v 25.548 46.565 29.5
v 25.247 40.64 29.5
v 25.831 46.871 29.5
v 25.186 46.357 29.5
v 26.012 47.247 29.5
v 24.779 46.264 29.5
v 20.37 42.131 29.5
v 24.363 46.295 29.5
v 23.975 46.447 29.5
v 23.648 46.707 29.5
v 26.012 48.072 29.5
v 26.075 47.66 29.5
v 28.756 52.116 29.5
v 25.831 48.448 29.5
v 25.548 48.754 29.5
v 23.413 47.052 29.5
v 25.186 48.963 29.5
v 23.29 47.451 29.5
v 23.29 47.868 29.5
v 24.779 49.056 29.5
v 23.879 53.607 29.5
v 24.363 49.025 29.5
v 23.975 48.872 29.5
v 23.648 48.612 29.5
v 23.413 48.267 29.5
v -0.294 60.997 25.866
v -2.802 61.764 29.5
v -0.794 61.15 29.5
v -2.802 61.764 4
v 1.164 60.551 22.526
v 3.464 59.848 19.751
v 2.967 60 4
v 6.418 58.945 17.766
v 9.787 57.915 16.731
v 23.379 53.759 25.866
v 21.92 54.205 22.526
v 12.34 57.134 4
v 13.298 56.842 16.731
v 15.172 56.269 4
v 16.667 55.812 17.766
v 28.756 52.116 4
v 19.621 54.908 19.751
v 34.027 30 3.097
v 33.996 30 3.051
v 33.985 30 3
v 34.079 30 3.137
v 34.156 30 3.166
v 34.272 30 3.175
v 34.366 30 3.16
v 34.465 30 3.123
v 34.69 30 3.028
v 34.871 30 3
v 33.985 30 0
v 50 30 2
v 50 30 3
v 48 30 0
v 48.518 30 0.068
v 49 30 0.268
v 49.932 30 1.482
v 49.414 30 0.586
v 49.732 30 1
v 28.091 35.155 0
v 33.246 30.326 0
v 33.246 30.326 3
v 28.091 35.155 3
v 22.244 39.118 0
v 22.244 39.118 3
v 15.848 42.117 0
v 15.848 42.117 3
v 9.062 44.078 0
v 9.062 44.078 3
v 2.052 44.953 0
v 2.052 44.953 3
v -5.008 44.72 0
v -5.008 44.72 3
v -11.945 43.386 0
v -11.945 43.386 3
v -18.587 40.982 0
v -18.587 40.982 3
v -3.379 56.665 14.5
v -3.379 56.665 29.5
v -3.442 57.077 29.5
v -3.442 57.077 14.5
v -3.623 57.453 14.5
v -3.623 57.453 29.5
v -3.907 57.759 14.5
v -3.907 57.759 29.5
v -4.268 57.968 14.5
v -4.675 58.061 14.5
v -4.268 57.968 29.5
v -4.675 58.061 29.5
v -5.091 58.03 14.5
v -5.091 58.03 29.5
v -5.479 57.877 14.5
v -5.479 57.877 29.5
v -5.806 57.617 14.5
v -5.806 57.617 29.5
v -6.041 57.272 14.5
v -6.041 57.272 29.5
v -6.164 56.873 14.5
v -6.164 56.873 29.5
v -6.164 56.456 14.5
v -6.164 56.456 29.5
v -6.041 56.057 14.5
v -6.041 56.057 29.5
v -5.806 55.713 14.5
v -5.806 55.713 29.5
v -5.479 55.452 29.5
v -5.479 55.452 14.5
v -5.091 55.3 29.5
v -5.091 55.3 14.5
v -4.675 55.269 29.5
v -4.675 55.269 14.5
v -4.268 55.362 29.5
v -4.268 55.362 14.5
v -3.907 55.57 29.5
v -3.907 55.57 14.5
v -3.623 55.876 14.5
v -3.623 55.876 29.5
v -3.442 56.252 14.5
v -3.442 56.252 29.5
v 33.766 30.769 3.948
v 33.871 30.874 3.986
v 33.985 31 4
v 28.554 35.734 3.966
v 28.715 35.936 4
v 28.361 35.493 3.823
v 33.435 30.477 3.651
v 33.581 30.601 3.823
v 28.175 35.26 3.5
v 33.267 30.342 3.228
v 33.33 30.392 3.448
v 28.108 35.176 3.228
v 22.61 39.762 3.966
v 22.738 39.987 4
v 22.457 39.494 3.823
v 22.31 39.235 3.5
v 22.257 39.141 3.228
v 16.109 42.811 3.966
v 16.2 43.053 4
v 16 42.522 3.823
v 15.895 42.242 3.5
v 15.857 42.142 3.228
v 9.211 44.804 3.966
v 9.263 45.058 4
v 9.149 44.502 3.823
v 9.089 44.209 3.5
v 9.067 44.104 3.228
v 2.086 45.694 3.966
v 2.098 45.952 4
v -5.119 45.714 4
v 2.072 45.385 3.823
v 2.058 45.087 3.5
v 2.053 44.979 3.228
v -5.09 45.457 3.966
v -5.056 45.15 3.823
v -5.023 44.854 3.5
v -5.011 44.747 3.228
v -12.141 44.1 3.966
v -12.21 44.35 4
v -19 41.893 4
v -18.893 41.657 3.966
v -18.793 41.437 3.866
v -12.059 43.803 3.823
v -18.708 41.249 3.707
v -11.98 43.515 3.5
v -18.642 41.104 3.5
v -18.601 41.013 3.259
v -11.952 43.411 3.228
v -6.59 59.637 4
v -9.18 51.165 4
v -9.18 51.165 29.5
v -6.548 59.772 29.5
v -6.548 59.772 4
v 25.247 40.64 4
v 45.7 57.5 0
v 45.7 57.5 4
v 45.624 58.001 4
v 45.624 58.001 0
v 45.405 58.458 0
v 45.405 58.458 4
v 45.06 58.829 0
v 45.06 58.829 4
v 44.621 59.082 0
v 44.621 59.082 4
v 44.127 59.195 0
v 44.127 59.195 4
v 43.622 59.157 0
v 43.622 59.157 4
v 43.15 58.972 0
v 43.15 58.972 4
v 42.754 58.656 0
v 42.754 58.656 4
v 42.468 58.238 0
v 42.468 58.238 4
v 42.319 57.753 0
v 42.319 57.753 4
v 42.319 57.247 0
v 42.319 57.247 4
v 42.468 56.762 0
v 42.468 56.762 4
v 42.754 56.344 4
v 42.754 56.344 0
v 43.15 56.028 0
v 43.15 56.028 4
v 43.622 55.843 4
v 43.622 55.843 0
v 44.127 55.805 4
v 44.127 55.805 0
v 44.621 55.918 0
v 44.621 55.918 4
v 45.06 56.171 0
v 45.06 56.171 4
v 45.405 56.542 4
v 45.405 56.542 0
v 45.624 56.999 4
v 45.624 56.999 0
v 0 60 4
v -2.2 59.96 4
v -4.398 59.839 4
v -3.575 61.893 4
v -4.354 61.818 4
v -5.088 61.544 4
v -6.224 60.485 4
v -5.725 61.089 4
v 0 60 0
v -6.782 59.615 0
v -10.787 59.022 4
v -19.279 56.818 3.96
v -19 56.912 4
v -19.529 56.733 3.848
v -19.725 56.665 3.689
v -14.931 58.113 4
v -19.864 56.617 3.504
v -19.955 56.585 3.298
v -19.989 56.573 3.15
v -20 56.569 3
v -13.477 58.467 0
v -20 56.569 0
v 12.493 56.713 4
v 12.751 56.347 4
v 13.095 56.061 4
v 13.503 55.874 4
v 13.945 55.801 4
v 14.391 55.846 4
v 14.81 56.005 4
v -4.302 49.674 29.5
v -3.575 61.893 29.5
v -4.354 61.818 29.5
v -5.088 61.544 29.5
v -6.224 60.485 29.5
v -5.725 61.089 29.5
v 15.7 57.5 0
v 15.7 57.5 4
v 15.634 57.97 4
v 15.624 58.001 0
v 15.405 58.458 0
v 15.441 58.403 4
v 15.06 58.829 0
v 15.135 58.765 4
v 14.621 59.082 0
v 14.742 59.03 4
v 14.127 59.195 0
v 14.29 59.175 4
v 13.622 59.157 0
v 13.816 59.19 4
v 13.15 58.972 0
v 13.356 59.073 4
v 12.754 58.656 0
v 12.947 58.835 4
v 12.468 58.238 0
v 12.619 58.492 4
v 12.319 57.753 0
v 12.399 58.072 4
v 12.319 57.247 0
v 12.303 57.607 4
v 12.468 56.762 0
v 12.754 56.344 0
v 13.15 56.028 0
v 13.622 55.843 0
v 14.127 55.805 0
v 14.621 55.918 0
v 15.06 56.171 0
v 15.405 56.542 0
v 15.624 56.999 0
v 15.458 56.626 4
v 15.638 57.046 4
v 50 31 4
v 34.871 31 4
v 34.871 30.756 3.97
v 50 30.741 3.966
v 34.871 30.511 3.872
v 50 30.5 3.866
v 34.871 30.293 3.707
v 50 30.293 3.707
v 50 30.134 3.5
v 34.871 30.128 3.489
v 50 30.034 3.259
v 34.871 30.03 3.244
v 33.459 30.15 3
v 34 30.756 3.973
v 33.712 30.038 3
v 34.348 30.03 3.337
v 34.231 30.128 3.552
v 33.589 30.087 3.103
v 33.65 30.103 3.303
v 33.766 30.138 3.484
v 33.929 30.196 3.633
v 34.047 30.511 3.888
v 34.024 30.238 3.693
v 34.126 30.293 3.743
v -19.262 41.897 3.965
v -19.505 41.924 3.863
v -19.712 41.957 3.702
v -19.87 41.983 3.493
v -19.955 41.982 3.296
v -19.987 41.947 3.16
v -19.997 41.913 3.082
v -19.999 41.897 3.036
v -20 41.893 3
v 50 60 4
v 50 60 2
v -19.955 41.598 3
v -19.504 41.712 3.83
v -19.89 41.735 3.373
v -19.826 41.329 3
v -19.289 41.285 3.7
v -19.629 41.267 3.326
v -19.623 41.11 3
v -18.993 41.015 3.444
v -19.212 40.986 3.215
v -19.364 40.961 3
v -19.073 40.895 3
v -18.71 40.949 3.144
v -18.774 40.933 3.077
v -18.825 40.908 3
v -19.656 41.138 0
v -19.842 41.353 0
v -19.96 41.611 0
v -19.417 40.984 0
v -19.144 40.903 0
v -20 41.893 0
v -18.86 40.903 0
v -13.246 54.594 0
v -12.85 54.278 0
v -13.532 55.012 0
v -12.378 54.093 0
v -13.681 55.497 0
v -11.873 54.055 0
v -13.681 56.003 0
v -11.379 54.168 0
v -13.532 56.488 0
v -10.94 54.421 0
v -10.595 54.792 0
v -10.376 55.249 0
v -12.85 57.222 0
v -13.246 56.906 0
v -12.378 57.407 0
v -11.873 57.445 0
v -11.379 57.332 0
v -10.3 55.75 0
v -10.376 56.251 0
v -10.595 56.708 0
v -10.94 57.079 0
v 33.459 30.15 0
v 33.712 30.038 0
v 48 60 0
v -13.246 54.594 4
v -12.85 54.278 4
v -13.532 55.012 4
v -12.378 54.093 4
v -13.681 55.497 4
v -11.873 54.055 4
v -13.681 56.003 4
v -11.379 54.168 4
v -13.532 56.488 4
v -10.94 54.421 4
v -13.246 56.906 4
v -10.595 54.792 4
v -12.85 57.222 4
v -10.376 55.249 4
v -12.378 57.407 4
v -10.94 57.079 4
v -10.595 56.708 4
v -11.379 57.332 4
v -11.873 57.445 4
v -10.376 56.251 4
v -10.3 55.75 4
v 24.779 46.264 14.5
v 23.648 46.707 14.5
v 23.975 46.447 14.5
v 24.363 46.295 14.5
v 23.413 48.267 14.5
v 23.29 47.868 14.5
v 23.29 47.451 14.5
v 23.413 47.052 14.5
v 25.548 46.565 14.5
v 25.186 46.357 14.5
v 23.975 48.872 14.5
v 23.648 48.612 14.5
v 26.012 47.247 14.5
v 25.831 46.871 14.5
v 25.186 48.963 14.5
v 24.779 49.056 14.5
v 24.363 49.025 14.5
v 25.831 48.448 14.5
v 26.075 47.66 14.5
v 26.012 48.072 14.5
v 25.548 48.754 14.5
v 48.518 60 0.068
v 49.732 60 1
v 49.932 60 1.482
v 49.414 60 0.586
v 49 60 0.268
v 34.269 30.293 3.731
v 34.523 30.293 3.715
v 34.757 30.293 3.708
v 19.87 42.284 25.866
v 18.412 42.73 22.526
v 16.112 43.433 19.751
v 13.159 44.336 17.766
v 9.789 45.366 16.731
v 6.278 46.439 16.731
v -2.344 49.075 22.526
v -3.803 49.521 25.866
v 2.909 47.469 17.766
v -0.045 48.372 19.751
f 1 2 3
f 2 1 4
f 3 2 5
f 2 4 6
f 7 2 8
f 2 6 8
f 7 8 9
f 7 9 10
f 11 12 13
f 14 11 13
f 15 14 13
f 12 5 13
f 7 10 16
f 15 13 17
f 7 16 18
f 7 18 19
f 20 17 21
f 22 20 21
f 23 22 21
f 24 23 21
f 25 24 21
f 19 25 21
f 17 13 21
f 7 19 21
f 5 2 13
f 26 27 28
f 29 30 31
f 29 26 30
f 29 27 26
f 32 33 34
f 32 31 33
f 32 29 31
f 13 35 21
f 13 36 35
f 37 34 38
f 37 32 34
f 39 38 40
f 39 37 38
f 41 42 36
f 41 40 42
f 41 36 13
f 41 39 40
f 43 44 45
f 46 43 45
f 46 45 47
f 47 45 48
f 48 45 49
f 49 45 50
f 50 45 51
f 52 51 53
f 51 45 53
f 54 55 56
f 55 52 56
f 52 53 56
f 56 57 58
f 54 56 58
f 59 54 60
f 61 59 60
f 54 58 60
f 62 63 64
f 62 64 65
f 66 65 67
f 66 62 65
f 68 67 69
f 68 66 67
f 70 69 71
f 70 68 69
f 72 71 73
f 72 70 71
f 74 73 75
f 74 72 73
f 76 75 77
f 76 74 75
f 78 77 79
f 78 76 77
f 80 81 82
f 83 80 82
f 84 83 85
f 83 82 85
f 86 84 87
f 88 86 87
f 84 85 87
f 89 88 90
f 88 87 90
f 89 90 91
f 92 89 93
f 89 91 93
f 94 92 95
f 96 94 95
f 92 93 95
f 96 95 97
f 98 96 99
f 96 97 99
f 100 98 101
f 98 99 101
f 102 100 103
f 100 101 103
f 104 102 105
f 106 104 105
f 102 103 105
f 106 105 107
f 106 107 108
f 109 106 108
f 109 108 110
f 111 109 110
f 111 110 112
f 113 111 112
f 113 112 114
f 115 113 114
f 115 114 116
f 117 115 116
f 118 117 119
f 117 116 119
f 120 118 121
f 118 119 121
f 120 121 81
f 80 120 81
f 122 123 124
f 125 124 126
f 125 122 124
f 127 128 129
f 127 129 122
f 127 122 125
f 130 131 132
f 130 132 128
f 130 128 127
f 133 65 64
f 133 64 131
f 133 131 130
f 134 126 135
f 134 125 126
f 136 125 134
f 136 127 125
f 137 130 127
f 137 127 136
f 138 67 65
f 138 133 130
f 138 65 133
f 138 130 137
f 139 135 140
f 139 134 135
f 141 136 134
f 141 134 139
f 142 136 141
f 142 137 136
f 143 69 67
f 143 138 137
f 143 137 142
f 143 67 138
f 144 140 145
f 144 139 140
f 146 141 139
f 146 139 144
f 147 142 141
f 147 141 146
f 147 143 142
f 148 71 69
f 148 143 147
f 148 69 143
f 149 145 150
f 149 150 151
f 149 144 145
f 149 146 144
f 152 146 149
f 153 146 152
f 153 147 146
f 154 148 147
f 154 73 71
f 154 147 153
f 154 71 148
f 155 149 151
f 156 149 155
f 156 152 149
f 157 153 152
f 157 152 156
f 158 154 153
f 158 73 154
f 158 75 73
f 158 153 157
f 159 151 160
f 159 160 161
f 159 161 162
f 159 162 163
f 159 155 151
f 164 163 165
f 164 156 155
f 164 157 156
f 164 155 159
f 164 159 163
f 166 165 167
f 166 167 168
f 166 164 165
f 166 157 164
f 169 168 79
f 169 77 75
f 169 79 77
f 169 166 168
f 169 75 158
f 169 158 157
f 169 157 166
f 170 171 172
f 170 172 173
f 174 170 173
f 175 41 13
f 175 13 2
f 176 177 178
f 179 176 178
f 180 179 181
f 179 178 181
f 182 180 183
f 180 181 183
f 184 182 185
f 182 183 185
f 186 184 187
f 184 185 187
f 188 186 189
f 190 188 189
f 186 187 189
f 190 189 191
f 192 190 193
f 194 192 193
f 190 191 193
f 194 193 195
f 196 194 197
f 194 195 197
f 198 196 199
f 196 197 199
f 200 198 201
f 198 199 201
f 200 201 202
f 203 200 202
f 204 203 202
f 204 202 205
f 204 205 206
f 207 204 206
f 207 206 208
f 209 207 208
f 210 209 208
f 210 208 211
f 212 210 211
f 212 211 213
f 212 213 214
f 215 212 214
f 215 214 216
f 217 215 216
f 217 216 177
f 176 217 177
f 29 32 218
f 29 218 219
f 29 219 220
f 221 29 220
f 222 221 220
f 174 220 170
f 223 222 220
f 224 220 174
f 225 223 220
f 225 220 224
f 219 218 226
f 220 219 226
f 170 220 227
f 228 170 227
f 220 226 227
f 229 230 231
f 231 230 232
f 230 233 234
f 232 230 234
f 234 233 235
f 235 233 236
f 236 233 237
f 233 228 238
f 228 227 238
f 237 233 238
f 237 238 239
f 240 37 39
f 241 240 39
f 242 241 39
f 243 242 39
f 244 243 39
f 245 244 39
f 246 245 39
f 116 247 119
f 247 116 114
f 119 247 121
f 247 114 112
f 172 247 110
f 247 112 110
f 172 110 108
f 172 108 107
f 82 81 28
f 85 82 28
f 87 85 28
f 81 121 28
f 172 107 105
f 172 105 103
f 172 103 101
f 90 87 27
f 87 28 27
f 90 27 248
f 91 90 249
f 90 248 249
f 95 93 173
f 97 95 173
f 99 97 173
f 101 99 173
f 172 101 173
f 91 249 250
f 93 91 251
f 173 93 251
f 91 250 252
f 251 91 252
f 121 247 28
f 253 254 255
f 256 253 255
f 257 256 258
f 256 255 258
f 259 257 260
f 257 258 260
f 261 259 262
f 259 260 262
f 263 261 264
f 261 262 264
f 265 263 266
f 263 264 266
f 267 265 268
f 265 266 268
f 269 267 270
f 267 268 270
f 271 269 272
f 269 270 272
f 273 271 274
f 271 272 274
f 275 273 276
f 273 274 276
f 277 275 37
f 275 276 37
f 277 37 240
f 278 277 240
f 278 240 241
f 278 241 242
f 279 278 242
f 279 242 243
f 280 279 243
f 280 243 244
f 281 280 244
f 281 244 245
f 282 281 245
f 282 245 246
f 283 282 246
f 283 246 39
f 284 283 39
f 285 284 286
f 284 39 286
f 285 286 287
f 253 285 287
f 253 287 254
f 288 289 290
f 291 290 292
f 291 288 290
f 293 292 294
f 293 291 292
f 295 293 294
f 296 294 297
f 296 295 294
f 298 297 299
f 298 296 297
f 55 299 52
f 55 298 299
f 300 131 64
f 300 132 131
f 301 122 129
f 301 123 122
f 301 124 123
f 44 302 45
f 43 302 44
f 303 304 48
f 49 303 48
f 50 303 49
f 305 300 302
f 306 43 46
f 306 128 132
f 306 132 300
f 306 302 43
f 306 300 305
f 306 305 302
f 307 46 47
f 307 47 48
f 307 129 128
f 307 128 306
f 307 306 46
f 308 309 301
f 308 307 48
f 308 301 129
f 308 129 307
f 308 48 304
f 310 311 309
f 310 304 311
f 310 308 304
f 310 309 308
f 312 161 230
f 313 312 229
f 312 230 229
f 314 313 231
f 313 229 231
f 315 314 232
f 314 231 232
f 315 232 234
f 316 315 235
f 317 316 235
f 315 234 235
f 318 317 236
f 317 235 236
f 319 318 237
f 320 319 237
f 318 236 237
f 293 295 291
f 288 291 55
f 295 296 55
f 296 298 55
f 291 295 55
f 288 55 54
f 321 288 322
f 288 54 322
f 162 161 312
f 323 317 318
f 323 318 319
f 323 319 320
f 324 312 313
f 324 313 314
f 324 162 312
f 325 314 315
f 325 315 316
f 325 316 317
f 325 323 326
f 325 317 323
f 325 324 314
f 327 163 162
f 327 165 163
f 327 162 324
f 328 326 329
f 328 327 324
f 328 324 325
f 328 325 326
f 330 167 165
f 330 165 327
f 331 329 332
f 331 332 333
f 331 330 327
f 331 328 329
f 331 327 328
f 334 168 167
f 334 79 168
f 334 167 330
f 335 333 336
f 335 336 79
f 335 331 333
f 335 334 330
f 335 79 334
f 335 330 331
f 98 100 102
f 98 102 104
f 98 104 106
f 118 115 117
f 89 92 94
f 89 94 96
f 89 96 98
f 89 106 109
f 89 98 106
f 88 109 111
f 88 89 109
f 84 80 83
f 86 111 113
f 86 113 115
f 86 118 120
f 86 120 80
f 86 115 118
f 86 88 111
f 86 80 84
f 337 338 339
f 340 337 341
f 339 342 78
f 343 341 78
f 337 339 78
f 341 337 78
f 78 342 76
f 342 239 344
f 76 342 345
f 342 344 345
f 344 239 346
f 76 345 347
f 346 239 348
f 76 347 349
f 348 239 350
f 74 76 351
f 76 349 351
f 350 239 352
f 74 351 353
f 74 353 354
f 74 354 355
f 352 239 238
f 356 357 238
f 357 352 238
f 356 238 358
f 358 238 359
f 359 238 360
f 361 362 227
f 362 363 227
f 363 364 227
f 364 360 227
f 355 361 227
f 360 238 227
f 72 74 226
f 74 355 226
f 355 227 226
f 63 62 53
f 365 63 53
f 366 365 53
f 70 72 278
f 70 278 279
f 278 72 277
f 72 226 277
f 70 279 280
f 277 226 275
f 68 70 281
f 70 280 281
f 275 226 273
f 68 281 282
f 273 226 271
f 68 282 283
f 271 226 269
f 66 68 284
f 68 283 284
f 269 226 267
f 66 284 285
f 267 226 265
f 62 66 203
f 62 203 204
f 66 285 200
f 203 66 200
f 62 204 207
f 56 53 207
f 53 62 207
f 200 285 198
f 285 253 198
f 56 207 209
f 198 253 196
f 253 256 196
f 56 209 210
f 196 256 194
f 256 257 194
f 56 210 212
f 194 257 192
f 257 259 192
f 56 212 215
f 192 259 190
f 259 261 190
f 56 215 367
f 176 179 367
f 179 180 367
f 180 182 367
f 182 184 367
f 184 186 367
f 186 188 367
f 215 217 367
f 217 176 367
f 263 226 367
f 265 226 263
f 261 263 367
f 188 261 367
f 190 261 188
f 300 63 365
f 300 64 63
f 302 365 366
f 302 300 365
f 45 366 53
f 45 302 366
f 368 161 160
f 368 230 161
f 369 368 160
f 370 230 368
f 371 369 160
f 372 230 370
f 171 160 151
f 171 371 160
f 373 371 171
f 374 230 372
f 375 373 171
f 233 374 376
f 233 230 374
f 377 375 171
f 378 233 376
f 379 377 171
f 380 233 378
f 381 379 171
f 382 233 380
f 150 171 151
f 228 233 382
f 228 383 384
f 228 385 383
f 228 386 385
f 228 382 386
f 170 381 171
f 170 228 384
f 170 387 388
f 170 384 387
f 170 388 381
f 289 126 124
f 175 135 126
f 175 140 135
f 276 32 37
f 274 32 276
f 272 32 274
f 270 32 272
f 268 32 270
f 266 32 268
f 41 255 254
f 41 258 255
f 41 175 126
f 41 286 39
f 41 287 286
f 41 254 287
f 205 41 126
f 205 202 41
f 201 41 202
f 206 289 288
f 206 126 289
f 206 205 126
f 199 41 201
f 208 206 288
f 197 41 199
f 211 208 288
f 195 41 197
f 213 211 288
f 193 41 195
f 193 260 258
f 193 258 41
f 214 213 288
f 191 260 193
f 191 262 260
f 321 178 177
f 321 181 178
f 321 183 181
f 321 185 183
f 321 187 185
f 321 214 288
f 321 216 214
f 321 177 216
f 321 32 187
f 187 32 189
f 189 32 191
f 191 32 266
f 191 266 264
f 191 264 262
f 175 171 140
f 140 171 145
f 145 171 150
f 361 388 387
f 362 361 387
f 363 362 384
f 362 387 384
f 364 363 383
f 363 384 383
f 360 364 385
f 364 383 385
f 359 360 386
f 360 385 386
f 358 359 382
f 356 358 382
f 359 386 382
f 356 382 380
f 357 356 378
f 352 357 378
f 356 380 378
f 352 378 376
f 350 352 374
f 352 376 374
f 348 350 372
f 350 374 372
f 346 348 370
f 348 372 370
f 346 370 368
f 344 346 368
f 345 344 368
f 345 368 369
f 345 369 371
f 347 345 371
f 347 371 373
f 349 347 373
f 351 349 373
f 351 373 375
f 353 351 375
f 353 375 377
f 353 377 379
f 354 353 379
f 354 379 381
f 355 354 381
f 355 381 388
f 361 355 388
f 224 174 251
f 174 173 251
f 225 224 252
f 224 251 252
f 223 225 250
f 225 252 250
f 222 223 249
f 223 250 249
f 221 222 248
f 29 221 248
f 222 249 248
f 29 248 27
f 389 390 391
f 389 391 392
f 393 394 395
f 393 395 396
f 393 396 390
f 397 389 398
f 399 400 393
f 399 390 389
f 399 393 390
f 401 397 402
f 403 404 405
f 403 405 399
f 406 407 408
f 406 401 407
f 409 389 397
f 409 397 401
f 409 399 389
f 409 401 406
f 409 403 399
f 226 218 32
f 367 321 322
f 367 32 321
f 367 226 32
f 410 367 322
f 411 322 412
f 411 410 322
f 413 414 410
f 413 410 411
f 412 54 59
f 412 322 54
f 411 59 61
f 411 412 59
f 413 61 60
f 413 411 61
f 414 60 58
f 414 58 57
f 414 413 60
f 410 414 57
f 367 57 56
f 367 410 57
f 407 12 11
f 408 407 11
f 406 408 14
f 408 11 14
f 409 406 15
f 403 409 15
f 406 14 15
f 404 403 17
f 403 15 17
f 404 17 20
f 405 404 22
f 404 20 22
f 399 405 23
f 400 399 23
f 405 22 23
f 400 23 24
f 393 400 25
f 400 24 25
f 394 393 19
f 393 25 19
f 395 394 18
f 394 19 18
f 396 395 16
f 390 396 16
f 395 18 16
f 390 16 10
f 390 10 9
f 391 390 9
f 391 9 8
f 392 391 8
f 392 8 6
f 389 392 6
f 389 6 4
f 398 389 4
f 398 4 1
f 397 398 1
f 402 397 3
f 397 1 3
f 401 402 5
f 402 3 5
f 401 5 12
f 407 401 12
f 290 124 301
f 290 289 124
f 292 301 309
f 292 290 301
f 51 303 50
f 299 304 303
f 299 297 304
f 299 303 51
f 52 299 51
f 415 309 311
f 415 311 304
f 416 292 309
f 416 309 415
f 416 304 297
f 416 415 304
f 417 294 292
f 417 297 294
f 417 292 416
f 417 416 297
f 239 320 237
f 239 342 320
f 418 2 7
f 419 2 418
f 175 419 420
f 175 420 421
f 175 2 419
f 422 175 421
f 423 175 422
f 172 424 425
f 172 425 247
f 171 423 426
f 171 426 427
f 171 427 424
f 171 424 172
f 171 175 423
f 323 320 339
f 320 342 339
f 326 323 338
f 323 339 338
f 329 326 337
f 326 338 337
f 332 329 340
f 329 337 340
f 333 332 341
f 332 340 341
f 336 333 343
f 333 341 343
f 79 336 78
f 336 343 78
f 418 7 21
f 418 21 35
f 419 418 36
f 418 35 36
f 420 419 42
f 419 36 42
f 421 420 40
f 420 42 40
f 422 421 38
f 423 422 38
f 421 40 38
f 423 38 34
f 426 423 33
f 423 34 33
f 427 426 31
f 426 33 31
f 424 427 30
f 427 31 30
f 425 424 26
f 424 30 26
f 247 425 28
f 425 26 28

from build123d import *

# Parameters (mm, degrees)
PAD_DEPTH       = 4
PAD001_DEPTH    = 25.5
SKETCH002_R     = 12.9
POCKET_DEPTH    = 35.4050611872
FILLET_R        = 2
FILLET001_R     = 1
FILLET002_R     = 1
FILLET003_R     = 1
FILLET004_R     = 3
SKETCH003_R     = 1.4
POCKET001_DEPTH = 15
SKETCH004_R     = 1.7
POCKET002_DEPTH = 5


with BuildPart() as part:
    # Sketch → Pad (new body)
    with BuildSketch(Plane.XY):
        with BuildLine():
            Line((33.5410196625, 30), (50, 30))
            Line((50, 30), (50, 60))
            Line((0, 60), (50, 60))
            ThreePointArc((0, 60), (-10.1461187235, 59.1359135792), (-20, 56.5685424949))
            Line((-20, 40.3112887415), (-20, 56.5685424949))
            ThreePointArc((33.5410196625, 30), (8.5100218715, 44.1880020792), (-20, 40.3112887415))
        make_face()
    extrude(amount=PAD_DEPTH)

    # Sketch001 → Pad001 (new body)
    with BuildSketch(Plane.XY.offset(4)):
        Polygon((-5.671183324, 62.6409760428), (28.7557878907, 52.1155946728), (25.247327434, 40.6399376012), (-9.1796437807, 51.1653189712), align=None)
    extrude(amount=PAD001_DEPTH)

    # Sketch002 → Pocket (cut, through all)
    with BuildSketch(Plane(origin=(17.029415001, 55.7007066474, 0), x_dir=(-0.956304756, 0.2923717047, 0), z_dir=(0.2923717047, 0.956304756, 0))):
        with Locations((5.7378285358, 29.5)):
            Circle(SKETCH002_R)
    extrude(amount=-POCKET_DEPTH, mode=Mode.SUBTRACT)

    # Fillet
    fillet_edges = [part.edges().sort_by_distance(p)[0] for p in [
        (50, 45, 0),
    ]]
    fillet(fillet_edges, radius=FILLET_R)

    # Fillet001
    fillet001_edges = [part.edges().sort_by_distance(p)[0] for p in [
        (-20, 48.439916, 4),
    ]]
    fillet(fillet001_edges, radius=FILLET001_R)

    # Fillet002
    fillet002_edges = [part.edges().sort_by_distance(p)[0] for p in [
        (9.054169, 44.079724, 4),
    ]]
    fillet(fillet002_edges, radius=FILLET002_R)

    # Fillet003
    fillet003_edges = [part.edges().sort_by_distance(p)[0] for p in [
        (42.435596, 30, 4),
    ]]
    fillet(fillet003_edges, radius=FILLET003_R)

    # Fillet004
    fillet004_edges = [part.edges().sort_by_distance(p)[0] for p in [
        (-5.671183, 62.640976, 16.75),
    ]]
    fillet(fillet004_edges, radius=FILLET004_R)

    # Sketch003 → Pocket001 (cut)
    with BuildSketch(Plane.XY.offset(29.5)):
        with Locations((-4.7794903371, 56.6647829722)):
            Circle(SKETCH003_R)
        with Locations((24.6746961465, 47.6597344667)):
            Circle(SKETCH003_R)
    extrude(amount=-POCKET001_DEPTH, mode=Mode.SUBTRACT)

    # Sketch004 → Pocket002 (cut)
    with BuildSketch(Plane.XY.offset(4)):
        with Locations((44, 57.5)):
            Circle(SKETCH004_R)
        with Locations((-12, 55.75)):
            Circle(SKETCH004_R)
        with Locations((14, 57.5)):
            Circle(SKETCH004_R)
    extrude(amount=-POCKET002_DEPTH, mode=Mode.SUBTRACT)


solid = part.part
